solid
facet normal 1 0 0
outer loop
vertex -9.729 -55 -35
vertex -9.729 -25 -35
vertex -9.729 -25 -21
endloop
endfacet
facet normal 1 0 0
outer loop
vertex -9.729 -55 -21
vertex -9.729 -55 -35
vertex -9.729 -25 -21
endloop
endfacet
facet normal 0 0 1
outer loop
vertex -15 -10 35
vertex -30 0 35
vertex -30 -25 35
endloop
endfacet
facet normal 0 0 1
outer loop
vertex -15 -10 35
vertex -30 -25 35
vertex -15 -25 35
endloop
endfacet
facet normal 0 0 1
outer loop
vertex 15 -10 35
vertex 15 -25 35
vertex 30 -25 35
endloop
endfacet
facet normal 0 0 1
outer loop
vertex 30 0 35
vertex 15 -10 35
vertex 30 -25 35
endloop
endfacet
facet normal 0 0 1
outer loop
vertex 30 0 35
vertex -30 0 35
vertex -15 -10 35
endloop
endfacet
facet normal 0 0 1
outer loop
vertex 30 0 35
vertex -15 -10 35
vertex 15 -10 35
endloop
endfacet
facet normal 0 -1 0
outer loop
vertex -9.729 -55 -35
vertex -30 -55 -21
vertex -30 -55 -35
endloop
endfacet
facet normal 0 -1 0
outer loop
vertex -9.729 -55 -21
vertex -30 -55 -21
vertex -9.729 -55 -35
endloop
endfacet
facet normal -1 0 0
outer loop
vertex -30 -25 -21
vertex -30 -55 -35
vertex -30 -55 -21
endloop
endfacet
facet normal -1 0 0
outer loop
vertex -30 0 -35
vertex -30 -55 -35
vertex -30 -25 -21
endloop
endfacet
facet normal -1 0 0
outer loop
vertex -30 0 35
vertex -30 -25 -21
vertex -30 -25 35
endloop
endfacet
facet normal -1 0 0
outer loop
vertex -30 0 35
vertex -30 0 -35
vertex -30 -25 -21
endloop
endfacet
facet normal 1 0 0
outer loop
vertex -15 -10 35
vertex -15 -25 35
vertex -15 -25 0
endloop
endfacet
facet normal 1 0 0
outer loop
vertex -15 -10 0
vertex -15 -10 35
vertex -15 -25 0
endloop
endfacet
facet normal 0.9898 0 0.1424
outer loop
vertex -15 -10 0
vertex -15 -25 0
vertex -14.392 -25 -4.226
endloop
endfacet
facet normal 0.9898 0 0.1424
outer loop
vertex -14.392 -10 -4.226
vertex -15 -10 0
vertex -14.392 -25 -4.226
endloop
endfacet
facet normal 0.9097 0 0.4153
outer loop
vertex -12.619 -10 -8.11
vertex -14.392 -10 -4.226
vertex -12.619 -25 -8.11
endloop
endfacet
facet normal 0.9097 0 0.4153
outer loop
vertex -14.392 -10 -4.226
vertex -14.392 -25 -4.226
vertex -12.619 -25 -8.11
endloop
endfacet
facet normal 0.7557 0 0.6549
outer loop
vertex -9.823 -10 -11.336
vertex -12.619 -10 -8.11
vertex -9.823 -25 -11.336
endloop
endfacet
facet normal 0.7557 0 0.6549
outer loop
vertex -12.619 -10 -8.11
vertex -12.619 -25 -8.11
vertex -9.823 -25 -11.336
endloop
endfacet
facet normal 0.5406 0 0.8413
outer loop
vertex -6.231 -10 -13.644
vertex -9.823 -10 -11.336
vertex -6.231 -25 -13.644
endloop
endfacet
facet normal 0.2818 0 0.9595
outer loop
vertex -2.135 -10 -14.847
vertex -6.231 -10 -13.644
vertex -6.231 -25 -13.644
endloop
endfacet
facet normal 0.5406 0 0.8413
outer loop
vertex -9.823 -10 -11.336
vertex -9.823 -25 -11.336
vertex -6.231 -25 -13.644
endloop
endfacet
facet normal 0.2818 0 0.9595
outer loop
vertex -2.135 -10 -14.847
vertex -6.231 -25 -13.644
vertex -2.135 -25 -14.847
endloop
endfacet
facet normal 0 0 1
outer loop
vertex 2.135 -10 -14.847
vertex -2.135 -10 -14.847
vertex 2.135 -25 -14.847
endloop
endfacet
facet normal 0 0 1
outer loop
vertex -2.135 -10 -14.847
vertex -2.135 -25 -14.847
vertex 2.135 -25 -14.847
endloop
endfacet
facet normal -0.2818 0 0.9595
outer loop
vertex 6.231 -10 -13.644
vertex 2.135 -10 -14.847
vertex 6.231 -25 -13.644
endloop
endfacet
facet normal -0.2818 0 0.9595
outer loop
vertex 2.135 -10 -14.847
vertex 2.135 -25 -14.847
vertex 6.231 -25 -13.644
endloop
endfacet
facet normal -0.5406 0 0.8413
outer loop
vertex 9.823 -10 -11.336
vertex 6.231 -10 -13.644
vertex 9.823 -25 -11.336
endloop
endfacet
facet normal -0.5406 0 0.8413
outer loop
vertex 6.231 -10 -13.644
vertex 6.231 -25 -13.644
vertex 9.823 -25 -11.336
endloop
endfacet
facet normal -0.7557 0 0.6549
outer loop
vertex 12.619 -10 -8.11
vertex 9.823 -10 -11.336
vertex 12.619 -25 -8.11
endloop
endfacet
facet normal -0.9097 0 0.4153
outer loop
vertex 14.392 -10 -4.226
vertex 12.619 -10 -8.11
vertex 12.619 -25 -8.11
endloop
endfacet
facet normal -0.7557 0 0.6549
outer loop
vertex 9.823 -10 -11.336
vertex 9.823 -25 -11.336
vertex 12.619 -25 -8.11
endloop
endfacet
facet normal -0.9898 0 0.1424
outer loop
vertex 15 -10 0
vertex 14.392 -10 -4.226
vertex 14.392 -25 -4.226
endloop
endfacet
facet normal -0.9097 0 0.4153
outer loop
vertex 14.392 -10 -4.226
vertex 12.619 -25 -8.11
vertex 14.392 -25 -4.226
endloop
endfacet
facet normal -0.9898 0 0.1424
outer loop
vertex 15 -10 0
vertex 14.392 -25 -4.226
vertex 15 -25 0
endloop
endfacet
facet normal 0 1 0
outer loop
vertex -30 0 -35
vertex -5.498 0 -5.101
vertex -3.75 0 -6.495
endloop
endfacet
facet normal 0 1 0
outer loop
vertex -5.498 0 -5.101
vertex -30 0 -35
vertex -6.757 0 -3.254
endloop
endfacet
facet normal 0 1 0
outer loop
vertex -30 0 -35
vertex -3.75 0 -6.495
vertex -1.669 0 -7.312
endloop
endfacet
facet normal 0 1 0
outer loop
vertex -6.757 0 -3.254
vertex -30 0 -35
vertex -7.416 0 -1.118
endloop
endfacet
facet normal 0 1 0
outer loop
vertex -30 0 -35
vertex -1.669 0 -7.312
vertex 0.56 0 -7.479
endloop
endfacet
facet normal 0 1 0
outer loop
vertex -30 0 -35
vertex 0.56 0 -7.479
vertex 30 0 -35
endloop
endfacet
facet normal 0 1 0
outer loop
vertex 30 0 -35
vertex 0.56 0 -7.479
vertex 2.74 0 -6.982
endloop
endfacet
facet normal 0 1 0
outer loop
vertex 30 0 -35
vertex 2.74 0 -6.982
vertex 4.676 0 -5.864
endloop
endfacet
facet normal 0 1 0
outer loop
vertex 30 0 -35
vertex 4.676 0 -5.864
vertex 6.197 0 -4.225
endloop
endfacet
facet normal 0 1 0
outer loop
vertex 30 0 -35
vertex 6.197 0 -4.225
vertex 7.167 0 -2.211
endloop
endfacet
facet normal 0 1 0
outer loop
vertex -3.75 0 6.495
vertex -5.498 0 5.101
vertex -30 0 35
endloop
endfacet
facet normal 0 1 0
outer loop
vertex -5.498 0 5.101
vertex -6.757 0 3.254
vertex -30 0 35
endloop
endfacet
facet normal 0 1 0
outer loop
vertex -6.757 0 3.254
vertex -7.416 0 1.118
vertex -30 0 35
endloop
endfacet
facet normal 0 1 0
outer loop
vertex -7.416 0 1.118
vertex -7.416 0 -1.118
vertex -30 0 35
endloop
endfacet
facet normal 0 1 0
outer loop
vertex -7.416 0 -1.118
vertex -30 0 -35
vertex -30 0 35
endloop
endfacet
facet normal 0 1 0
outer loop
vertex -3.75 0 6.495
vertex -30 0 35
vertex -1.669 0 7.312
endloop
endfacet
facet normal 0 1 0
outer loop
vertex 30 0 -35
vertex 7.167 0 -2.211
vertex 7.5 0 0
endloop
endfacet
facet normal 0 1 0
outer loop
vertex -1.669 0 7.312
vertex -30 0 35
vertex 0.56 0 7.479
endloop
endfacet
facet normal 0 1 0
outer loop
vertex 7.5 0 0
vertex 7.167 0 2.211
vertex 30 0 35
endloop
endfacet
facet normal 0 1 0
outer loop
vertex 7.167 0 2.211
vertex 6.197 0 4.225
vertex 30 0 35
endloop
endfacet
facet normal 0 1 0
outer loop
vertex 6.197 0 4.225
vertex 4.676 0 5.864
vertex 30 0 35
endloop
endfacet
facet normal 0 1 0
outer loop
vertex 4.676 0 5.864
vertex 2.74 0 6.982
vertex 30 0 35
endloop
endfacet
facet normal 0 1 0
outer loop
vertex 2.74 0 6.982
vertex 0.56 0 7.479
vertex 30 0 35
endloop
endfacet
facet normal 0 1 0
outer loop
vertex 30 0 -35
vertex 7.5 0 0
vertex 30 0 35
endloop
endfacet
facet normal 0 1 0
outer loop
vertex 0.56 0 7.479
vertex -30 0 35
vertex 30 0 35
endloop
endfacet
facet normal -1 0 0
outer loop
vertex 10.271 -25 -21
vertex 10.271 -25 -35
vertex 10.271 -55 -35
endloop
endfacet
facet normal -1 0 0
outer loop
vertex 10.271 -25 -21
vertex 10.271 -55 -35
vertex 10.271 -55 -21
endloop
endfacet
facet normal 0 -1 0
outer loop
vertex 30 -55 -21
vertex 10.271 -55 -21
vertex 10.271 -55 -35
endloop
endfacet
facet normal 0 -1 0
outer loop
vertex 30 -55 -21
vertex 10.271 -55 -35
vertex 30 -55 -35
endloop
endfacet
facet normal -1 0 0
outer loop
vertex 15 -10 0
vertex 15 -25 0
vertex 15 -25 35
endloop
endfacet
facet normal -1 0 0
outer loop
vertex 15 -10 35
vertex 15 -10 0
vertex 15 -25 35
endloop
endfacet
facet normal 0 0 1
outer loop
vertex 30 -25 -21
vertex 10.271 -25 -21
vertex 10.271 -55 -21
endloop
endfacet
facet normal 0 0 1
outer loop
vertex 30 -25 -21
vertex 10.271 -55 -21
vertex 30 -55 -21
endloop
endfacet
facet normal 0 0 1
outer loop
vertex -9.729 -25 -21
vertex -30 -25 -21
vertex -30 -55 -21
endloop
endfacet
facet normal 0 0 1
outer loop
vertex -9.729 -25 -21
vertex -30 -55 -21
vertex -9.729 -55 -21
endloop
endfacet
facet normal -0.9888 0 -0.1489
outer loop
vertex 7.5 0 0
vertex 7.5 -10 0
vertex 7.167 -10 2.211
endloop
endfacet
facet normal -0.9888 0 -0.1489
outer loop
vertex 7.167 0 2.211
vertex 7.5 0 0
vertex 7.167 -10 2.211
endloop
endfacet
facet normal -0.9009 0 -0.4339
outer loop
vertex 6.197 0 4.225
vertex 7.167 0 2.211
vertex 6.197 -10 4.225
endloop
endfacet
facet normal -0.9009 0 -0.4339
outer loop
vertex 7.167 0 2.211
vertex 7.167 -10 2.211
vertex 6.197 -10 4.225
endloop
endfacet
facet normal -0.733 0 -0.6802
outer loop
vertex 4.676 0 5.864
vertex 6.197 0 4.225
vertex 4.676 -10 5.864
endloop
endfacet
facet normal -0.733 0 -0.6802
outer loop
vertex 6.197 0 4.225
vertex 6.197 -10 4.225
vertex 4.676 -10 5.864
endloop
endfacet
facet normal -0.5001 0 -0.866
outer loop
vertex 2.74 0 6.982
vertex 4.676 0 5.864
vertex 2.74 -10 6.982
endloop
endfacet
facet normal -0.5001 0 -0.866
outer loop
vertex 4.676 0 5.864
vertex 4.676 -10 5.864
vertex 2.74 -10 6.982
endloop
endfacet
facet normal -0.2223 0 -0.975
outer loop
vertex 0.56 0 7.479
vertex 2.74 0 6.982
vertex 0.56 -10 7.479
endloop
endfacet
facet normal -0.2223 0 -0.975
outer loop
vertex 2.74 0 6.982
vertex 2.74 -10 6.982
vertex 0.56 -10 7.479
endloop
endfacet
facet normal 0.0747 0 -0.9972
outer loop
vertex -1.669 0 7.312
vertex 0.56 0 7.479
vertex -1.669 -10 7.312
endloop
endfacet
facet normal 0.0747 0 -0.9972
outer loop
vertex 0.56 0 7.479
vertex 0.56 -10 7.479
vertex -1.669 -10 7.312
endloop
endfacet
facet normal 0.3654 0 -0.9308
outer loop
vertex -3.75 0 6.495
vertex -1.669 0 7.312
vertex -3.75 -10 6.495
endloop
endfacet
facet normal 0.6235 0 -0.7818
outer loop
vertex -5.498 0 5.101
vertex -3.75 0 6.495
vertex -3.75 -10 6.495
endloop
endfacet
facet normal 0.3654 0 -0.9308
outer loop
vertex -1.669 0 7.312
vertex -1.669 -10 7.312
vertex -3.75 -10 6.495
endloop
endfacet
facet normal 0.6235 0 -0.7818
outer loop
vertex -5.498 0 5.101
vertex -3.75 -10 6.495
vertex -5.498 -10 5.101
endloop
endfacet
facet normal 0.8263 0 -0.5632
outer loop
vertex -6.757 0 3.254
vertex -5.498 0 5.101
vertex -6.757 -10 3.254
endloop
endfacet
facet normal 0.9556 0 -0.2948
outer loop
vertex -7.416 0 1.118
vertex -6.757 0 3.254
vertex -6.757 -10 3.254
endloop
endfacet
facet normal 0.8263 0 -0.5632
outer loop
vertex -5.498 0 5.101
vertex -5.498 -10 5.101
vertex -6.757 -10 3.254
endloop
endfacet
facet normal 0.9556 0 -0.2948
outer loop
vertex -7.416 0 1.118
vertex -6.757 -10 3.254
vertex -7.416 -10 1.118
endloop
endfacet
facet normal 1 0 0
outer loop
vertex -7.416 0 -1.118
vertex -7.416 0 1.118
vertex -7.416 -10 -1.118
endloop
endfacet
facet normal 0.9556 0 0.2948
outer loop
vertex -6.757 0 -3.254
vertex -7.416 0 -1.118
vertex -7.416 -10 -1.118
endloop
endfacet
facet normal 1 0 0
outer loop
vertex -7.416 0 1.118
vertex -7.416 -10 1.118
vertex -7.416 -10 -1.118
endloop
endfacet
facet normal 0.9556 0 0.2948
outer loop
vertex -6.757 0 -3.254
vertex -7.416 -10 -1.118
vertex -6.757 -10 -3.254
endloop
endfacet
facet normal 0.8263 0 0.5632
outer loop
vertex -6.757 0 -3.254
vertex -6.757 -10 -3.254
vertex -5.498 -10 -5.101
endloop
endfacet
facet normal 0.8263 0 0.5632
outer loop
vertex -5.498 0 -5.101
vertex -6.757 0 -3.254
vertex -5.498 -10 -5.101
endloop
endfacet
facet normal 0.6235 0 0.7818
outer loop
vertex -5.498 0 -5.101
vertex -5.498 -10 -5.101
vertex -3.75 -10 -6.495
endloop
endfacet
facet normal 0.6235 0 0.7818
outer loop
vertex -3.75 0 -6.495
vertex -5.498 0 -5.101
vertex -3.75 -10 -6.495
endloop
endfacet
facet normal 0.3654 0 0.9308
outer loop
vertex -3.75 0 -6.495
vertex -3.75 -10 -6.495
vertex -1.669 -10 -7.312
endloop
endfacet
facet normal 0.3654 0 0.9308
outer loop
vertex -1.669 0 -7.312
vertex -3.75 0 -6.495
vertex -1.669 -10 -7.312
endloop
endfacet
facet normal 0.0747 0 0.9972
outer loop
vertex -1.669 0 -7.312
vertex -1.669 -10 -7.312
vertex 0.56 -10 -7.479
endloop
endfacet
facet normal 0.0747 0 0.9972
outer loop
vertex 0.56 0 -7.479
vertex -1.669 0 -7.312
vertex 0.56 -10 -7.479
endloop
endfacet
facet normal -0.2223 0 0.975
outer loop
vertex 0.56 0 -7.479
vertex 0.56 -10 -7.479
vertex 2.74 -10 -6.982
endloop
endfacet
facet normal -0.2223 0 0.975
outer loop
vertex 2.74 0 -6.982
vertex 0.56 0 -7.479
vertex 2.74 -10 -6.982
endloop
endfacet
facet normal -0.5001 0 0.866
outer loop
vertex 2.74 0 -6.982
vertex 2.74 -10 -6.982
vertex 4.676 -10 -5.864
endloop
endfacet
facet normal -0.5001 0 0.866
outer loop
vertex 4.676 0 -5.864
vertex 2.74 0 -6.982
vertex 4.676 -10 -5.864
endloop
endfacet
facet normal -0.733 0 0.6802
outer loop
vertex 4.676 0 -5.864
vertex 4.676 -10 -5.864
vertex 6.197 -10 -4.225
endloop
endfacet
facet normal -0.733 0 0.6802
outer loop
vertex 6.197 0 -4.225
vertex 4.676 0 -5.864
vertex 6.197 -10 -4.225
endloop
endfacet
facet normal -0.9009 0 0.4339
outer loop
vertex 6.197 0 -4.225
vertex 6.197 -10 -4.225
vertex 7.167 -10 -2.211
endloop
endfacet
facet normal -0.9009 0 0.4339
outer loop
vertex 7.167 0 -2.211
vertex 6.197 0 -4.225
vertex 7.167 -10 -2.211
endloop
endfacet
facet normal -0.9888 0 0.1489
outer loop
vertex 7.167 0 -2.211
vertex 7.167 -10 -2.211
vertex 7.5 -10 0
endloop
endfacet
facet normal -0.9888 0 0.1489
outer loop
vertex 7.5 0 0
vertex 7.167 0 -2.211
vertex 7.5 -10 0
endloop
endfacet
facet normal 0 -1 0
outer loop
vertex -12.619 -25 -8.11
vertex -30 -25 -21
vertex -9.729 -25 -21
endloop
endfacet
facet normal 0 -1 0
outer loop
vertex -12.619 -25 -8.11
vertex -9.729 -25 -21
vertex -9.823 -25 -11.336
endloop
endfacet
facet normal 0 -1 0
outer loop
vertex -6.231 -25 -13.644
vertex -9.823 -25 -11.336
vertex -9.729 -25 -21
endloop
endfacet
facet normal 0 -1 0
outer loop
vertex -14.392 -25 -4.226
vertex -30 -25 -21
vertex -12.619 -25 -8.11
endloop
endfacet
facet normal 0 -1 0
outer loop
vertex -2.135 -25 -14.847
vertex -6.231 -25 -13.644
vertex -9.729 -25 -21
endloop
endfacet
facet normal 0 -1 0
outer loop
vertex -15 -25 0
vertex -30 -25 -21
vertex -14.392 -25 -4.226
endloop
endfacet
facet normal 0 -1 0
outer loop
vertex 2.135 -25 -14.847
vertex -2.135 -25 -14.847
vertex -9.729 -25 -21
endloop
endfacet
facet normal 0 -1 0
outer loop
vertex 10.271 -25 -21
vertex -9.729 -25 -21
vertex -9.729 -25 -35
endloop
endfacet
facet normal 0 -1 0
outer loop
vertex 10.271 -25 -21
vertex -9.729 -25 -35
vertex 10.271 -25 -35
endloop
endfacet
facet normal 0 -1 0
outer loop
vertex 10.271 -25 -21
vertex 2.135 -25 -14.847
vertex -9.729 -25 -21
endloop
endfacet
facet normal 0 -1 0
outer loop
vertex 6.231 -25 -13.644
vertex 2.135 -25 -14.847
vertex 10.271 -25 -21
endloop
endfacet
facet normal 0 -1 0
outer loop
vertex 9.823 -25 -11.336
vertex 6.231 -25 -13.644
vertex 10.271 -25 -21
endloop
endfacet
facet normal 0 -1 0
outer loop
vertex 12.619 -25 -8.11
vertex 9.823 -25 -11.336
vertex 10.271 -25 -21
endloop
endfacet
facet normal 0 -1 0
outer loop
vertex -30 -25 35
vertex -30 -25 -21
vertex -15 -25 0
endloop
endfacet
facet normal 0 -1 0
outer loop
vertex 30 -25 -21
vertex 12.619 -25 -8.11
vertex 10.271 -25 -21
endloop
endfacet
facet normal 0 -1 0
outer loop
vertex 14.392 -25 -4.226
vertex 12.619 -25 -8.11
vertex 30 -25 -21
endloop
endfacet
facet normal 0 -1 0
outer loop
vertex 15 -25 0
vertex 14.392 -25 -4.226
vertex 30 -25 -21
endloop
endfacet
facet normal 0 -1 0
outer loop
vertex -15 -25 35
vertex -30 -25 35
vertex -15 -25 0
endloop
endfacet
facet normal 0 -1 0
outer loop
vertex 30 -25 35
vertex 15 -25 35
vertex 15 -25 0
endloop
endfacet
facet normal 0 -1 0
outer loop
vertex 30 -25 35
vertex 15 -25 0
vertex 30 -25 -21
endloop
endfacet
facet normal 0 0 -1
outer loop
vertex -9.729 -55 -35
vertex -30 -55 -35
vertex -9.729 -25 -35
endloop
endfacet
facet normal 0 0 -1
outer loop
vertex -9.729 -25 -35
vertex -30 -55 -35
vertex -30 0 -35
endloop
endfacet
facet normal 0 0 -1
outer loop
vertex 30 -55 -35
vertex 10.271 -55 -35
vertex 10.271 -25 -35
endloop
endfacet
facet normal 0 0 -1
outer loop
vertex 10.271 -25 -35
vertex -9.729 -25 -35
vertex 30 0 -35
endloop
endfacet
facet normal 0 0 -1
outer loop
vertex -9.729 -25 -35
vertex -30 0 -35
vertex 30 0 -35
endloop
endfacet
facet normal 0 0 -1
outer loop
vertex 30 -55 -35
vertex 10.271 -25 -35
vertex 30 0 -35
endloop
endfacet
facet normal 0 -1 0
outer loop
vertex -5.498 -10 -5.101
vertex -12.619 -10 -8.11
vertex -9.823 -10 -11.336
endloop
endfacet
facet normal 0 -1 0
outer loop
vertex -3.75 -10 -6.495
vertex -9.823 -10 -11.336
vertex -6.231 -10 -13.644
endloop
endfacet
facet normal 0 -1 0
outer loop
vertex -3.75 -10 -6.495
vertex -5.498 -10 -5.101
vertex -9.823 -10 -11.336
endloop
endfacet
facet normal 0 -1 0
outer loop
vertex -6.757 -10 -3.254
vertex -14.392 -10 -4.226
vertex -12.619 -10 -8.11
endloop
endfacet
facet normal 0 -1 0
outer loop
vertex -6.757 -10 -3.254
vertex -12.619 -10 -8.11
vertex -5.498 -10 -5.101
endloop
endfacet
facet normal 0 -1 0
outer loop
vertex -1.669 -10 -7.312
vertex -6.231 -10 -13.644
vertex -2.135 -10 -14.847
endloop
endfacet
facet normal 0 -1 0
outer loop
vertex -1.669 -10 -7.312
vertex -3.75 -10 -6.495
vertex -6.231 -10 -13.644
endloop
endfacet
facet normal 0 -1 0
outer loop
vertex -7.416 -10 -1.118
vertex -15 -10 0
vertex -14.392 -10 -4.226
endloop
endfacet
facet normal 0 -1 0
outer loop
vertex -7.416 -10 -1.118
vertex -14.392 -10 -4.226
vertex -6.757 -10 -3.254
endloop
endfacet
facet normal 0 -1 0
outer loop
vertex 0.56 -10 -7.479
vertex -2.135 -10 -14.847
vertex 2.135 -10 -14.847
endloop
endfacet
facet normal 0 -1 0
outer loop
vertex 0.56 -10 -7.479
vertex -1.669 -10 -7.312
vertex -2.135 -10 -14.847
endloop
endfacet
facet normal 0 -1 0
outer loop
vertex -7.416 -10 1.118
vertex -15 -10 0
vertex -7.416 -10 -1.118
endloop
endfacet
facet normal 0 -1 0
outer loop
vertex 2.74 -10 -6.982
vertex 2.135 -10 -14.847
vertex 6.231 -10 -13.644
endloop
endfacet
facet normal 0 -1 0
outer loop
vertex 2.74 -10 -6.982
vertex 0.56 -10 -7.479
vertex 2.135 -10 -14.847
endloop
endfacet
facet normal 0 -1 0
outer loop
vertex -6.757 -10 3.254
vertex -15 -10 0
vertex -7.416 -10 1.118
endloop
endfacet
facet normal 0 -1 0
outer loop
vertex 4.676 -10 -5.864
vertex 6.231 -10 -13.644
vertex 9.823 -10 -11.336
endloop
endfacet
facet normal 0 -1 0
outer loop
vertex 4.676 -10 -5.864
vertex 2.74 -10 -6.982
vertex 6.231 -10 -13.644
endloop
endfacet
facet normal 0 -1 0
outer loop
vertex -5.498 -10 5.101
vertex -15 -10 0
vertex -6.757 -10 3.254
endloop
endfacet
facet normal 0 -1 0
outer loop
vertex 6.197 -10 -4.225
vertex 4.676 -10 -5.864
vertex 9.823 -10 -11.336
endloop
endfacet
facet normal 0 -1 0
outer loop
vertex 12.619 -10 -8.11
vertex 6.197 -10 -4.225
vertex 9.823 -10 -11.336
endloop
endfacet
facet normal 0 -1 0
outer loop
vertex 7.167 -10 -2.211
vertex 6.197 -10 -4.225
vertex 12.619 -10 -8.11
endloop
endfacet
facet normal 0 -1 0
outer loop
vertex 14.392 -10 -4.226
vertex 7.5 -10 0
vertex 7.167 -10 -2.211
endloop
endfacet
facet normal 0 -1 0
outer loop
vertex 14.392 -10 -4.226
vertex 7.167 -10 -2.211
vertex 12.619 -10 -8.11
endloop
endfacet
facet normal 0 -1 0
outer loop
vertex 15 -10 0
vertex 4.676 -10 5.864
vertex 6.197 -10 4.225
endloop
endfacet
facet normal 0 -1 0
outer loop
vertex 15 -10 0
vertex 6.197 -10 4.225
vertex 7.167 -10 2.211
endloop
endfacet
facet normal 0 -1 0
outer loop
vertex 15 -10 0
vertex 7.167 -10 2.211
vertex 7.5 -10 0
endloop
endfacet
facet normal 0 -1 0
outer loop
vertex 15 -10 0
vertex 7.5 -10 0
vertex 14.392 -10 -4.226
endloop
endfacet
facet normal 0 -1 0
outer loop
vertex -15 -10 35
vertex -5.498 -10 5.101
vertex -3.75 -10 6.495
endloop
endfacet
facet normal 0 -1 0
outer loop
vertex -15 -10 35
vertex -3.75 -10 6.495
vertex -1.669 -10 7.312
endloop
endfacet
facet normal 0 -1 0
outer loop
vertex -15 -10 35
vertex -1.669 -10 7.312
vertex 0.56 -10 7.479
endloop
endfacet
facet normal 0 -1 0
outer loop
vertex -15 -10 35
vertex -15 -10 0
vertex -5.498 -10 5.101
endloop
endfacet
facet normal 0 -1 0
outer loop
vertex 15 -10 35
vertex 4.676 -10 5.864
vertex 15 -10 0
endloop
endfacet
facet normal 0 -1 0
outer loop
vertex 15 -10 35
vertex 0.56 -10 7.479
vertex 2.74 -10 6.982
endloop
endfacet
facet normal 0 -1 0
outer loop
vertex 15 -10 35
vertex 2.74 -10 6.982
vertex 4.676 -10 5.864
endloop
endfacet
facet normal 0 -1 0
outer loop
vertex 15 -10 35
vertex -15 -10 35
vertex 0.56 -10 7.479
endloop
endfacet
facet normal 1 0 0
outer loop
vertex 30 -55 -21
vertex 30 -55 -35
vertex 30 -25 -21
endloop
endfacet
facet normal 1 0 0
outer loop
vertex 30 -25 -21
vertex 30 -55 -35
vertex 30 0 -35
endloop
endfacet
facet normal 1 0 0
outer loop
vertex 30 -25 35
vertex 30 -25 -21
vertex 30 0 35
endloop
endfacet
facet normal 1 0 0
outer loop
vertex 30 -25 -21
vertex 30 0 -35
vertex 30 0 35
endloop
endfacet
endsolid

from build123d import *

# Parameters (mm, degrees)
F0_W      = 60
F0_H      = 70
F1_DEPTH  = 25
F3_DEPTH  = 15
F4_R      = 7.5
F5_DEPTH  = 25
F5_FACE_R = 7.5
F6_DEPTH  = 25.001
F7_W      = 19.729286
F7_H      = 14
F7_W_2    = 20.270714
F8_DEPTH  = 30


with BuildPart() as f1:
    # F0 (on Front) → F1 (new body)
    with BuildSketch(Plane.XZ):
        Rectangle(F0_W, F0_H)
    extrude(amount=F1_DEPTH)

    # F2 (on face) → F3 (cut)
    with BuildSketch(Plane.XZ.offset(25)):
        with BuildLine():
            Line((-15, 35), (-15, 0))
            ThreePointArc((-15, 0), (0, -15), (15, 0))
            Line((15, 0), (15, 35))
            Line((15, 35), (-15, 35))
        make_face()
    extrude(amount=-F3_DEPTH, mode=Mode.SUBTRACT)

    # F4 (on Front) → F5 (join)
    with BuildSketch(Plane.XZ):
        Circle(F4_R)
    extrude(amount=F5_DEPTH)

    # F5_face (on face) → F6 (cut, through all)
    with BuildSketch(Plane.XZ.offset(25)):
        Circle(F5_FACE_R)
    extrude(amount=-F6_DEPTH, mode=Mode.SUBTRACT)

    # F7 (on face) → F8 (join)
    with BuildSketch(Plane.XZ.offset(25)):
        with Locations((20.135357, -28)):
            Rectangle(F7_W, F7_H)
        with Locations((-19.864643, -28)):
            Rectangle(F7_W_2, F7_H)
    extrude(amount=F8_DEPTH)


solid = f1.part
